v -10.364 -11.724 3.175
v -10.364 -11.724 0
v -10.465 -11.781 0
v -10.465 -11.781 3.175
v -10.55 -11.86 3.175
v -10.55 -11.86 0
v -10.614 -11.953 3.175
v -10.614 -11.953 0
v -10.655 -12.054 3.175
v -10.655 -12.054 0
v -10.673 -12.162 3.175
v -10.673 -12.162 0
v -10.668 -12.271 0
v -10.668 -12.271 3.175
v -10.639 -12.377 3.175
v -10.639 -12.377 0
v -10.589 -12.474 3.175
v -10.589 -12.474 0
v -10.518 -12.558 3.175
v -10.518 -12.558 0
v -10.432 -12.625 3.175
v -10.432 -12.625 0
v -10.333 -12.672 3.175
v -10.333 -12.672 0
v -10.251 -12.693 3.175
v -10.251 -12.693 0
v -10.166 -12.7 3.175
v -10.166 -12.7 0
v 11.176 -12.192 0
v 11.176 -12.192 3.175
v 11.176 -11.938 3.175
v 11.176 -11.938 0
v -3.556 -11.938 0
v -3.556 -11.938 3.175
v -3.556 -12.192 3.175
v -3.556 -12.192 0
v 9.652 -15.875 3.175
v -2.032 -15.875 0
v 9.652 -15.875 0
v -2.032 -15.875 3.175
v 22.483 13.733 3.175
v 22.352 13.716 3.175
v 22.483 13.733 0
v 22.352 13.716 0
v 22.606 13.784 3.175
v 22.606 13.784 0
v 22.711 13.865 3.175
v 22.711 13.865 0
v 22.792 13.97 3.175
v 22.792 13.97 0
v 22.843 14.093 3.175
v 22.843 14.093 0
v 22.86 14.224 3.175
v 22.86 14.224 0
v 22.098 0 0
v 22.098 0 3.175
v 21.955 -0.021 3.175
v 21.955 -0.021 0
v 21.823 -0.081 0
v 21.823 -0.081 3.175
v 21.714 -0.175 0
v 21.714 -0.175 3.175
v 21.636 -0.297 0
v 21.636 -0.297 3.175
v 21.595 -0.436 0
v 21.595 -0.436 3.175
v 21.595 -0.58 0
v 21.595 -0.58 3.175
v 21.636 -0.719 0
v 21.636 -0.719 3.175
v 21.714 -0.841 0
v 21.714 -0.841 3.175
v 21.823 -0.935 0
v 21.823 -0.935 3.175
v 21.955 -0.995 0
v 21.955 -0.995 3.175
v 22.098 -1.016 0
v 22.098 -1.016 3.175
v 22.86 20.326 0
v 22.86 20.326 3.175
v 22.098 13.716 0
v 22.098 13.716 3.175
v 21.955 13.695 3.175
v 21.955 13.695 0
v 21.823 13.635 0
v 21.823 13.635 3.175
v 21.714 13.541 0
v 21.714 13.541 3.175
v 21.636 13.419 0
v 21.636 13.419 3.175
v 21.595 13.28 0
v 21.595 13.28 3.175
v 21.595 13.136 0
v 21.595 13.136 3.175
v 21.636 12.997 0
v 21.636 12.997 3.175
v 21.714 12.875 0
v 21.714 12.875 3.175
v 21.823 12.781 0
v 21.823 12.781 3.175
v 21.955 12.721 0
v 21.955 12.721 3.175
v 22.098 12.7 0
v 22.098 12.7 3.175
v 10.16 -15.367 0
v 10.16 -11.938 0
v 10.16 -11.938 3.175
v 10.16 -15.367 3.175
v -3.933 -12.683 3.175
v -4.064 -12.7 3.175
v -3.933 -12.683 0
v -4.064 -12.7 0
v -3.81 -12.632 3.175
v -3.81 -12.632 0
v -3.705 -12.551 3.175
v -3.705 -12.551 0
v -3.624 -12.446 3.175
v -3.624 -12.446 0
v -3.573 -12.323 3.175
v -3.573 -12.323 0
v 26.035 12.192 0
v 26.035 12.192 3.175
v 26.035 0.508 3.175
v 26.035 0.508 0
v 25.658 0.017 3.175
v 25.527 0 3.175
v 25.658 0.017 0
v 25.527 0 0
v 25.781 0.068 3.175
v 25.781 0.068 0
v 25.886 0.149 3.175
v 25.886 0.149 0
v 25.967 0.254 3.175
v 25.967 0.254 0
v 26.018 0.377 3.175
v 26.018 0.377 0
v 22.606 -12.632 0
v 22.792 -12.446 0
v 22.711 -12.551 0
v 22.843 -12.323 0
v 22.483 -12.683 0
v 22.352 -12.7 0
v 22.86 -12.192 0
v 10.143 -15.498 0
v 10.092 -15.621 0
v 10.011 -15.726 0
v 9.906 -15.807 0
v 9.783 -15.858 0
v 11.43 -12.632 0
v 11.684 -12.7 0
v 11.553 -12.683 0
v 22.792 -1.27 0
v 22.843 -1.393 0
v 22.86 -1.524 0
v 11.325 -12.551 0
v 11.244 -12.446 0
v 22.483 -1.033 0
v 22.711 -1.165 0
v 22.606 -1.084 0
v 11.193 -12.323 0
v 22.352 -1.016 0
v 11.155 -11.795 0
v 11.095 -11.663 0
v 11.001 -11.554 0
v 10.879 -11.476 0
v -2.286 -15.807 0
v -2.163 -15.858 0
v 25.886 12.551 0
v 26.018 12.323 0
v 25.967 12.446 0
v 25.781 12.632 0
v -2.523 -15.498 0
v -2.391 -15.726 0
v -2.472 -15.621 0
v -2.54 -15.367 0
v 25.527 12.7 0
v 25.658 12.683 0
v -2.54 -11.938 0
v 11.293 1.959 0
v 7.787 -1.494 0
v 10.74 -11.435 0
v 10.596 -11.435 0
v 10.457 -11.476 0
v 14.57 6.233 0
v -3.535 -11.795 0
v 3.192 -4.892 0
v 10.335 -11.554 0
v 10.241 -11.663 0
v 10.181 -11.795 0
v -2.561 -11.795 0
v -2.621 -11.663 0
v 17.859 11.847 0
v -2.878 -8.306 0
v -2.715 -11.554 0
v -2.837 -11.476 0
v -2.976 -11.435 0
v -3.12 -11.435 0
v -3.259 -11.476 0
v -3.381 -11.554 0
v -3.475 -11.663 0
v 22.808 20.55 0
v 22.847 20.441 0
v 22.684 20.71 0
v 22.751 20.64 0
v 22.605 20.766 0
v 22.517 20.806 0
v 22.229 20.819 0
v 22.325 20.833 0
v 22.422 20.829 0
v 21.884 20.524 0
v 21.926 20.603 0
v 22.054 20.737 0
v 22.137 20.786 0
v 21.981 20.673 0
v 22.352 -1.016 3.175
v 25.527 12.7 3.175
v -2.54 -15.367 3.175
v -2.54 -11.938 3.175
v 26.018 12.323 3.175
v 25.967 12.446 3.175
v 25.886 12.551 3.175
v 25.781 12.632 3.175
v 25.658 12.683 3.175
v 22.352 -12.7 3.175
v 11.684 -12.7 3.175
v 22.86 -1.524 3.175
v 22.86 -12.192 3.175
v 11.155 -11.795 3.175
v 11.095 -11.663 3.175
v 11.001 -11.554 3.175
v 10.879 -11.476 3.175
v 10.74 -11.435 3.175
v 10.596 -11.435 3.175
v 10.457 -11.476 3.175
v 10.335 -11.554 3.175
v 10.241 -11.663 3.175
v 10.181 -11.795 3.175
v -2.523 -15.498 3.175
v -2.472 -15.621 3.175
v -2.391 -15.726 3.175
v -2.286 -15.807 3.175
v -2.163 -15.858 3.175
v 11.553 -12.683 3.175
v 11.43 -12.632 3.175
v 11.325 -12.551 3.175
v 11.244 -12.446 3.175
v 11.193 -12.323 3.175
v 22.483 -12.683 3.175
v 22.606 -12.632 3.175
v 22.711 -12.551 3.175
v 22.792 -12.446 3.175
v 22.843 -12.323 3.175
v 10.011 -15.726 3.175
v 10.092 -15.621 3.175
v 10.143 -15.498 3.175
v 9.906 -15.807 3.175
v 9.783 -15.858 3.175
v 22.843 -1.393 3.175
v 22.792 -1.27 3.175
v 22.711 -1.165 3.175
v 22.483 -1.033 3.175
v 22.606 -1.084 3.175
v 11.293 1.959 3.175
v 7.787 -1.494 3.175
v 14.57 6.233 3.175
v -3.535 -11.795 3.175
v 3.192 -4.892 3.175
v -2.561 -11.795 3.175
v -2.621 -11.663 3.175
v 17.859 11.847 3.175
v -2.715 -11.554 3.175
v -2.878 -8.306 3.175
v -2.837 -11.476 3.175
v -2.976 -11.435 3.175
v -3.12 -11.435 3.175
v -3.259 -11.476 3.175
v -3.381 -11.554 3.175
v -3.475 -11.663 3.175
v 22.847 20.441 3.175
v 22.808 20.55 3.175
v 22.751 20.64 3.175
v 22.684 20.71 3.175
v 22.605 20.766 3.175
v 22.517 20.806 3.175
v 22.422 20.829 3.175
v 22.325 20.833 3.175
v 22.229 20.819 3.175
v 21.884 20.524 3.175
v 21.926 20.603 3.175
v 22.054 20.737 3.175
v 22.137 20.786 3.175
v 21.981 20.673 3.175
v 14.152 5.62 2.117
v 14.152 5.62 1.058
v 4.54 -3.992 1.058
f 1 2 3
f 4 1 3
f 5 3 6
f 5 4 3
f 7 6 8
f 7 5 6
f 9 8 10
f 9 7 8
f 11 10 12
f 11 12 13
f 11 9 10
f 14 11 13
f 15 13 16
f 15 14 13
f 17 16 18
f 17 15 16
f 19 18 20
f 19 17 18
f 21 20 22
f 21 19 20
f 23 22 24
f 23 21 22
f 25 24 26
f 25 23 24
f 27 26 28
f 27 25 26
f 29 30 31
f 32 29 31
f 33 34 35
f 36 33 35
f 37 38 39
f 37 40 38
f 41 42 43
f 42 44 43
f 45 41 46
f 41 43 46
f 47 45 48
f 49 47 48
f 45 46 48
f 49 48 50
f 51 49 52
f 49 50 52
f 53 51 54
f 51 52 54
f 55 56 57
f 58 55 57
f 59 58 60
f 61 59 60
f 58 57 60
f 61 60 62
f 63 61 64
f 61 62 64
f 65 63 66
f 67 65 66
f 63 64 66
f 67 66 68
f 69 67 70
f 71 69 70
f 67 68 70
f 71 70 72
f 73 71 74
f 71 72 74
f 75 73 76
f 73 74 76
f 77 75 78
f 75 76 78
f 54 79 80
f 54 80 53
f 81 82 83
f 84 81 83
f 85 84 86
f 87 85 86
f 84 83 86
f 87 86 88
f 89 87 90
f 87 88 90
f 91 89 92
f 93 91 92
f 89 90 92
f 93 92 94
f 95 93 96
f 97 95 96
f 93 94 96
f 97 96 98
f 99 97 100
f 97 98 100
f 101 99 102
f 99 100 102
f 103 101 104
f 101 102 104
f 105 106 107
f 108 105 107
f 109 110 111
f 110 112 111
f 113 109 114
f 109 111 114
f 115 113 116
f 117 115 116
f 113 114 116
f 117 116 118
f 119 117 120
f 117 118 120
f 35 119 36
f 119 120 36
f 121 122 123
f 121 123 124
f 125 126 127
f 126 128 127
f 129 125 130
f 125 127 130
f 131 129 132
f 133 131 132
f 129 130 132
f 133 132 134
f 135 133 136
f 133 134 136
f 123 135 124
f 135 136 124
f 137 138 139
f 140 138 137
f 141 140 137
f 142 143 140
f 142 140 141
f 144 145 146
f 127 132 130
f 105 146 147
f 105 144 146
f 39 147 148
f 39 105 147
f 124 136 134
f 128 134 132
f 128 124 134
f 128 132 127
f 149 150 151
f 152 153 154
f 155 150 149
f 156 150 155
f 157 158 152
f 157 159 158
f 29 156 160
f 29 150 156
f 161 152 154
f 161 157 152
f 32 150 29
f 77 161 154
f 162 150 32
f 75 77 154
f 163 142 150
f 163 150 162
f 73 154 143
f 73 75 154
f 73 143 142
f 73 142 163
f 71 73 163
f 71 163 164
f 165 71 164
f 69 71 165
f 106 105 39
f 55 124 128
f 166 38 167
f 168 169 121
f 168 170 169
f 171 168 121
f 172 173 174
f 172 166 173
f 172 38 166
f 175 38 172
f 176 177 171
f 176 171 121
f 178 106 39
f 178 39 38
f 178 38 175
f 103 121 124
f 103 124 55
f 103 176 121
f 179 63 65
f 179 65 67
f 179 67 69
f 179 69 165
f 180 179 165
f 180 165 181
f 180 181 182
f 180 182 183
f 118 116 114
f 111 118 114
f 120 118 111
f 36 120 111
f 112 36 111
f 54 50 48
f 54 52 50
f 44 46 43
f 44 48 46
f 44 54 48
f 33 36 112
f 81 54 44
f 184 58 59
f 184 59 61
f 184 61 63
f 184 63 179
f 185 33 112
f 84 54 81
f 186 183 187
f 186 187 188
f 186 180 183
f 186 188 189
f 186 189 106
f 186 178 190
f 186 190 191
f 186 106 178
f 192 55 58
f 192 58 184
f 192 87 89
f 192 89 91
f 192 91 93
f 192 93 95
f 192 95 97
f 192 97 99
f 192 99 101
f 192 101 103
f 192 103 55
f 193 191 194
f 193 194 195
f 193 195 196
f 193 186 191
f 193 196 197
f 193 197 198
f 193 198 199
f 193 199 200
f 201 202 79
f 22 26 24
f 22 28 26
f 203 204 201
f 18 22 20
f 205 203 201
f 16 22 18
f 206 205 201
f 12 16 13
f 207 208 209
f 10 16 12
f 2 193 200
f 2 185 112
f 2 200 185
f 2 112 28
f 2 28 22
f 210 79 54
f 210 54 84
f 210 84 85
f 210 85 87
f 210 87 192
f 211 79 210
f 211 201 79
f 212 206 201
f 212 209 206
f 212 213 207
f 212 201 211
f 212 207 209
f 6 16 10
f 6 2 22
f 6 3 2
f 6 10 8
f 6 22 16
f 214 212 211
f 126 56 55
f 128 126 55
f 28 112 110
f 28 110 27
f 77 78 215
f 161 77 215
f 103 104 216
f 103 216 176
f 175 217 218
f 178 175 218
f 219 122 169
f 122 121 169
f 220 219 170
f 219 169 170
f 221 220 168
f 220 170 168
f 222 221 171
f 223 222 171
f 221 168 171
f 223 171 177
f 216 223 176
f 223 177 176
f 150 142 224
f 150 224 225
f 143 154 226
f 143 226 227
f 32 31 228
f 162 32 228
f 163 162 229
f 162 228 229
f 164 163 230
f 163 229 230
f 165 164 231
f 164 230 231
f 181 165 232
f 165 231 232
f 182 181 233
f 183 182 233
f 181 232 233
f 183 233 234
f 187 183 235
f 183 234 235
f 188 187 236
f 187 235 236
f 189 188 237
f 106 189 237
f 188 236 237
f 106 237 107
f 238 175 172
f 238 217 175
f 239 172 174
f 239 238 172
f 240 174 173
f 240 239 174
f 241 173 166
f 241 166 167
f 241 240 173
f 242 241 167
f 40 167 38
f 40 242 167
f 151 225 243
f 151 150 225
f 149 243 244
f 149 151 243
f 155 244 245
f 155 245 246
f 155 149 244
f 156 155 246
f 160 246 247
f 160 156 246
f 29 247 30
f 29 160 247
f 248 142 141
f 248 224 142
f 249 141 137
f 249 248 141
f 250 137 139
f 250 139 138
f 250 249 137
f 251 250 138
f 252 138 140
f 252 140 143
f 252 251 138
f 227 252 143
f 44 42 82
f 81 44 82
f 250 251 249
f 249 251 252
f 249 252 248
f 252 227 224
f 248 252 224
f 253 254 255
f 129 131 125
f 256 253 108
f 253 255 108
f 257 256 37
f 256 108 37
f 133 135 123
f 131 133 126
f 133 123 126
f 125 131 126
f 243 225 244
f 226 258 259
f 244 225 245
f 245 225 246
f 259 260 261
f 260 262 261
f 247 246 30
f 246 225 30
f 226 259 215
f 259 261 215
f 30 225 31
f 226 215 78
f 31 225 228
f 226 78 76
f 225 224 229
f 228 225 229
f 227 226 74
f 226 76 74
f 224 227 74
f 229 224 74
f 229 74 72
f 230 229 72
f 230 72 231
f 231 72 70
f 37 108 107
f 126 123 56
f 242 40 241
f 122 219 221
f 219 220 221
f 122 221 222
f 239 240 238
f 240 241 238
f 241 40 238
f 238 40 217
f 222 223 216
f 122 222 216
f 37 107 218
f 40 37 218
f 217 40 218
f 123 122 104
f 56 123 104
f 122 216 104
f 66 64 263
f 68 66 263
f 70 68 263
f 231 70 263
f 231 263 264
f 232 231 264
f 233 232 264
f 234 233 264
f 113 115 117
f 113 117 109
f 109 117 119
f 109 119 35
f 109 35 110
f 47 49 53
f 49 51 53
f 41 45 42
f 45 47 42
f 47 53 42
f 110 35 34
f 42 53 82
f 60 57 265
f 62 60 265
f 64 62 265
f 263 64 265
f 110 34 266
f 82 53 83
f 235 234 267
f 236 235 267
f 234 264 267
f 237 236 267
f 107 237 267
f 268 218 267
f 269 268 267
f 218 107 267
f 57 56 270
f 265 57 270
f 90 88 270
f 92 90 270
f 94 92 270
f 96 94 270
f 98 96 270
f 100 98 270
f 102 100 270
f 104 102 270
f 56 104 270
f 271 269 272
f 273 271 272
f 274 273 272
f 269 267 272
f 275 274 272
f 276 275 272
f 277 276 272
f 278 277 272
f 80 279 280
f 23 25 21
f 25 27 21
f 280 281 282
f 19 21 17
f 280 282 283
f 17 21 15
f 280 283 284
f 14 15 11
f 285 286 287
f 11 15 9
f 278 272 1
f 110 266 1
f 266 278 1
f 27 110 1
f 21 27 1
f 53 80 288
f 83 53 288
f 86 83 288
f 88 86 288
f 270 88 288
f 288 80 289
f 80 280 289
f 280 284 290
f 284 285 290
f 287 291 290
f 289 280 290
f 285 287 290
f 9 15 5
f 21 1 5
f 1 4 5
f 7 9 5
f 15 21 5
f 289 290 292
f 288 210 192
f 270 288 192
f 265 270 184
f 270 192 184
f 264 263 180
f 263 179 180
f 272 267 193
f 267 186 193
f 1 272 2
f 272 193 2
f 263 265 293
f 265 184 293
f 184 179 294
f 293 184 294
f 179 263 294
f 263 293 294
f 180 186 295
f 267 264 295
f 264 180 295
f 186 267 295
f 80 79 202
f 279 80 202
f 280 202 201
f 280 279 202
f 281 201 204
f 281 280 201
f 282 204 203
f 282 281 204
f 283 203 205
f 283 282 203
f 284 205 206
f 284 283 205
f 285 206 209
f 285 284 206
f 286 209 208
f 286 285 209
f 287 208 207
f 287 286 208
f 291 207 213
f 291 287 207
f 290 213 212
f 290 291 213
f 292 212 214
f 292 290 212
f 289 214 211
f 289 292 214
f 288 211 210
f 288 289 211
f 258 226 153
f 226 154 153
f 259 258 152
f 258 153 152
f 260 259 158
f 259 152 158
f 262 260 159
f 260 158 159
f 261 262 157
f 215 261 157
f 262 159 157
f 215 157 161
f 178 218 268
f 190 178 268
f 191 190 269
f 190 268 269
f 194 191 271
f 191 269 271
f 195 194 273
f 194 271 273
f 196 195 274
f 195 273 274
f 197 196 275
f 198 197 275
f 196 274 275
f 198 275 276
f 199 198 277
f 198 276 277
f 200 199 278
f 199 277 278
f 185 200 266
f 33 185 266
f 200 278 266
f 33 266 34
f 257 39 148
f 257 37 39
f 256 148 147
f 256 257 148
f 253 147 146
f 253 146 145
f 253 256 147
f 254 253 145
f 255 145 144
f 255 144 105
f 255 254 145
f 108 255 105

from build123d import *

# Parameters (mm, degrees)
BOSS_EXTRUDE1_DEPTH = 3.175
SKETCH2_W           = 12.7
SKETCH2_H           = 3.175
BOSS_EXTRUDE2_DEPTH = 3.175
SKETCH3_W           = 3.175
SKETCH3_H           = 12.7
BOSS_EXTRUDE3_DEPTH = 3.175
CUT_EXTRUDE1_REACH  = 5.175
FILLET1_R           = 0.508


with BuildPart() as part:
    # Sketch1 → Boss-Extrude1 (new body)
    with BuildSketch(Plane.XY):
        with BuildLine():
            Line((22.86, -12.7), (-12.7, -12.7))
            add(Edge.make_bspline(
                [(22.86, 22.86), (14.060256121, 1.487897552), (8.672102448, -3.900256121), (-12.7, -12.7)],
                knots=[0, 0, 0, 0, 1, 1, 1, 1], degree=3))
            Line((22.86, 22.86), (22.86, -12.7))
        make_face()
    extrude(amount=BOSS_EXTRUDE1_DEPTH)

    # Sketch2 → Boss-Extrude2 (add)
    with BuildSketch(Plane.XZ.offset(12.7)):
        with Locations((3.81, 1.5875)):
            Rectangle(SKETCH2_W, SKETCH2_H)
    extrude(amount=BOSS_EXTRUDE2_DEPTH)

    # Sketch3 → Boss-Extrude3 (add)
    with BuildSketch(Plane(origin=(22.86, 0, 0), x_dir=(0, 0, -1), z_dir=(1, 0, 0))):
        with Locations((-1.5875, 6.35)):
            Rectangle(SKETCH3_W, SKETCH3_H)
    extrude(amount=BOSS_EXTRUDE3_DEPTH)

    # Sketch4 → Cut-Extrude1 (cut, up to next)
    with BuildSketch(Plane.XY.offset(3.175), mode=Mode.PRIVATE) as cut_extrude1_sk1:
        with BuildLine():
            Line((-3.556, -11.938), (-3.556, -12.7))
            Line((-3.556, -12.7), (-2.54, -12.7))
            Line((-2.54, -12.7), (-2.54, -11.938))
            ThreePointArc((-2.54, -11.938), (-3.048, -11.43), (-3.556, -11.938))
        make_face()
    cut_extrude1_tool1 = extrude(cut_extrude1_sk1.sketch, amount=-CUT_EXTRUDE1_REACH, mode=Mode.PRIVATE) & part.part
    add(cut_extrude1_tool1.solids().sort_by_distance((-3.048, -12.113972, 3.175))[0], mode=Mode.SUBTRACT)
    # Sketch4 → Cut-Extrude1 (cut, up to next)
    with BuildSketch(Plane.XY.offset(3.175), mode=Mode.PRIVATE) as cut_extrude1_sk2:
        with BuildLine():
            Line((10.16, -11.938), (10.16, -12.7))
            Line((10.16, -12.7), (11.176, -12.7))
            Line((11.176, -12.7), (11.176, -11.938))
            ThreePointArc((11.176, -11.938), (10.668, -11.43), (10.16, -11.938))
        make_face()
    cut_extrude1_tool2 = extrude(cut_extrude1_sk2.sketch, amount=-CUT_EXTRUDE1_REACH, mode=Mode.PRIVATE) & part.part
    add(cut_extrude1_tool2.solids().sort_by_distance((10.668, -12.113972, 3.175))[0], mode=Mode.SUBTRACT)
    # Sketch4 → Cut-Extrude1 (cut, up to next)
    with BuildSketch(Plane.XY.offset(3.175), mode=Mode.PRIVATE) as cut_extrude1_sk3:
        with BuildLine():
            Line((22.098, -1.016), (22.86, -1.016))
            Line((22.86, -1.016), (22.86, 0))
            Line((22.86, 0), (22.098, 0))
            ThreePointArc((22.098, 0), (21.59, -0.508), (22.098, -1.016))
        make_face()
    cut_extrude1_tool3 = extrude(cut_extrude1_sk3.sketch, amount=-CUT_EXTRUDE1_REACH, mode=Mode.PRIVATE) & part.part
    add(cut_extrude1_tool3.solids().sort_by_distance((22.273972, -0.508, 3.175))[0], mode=Mode.SUBTRACT)
    # Sketch4 → Cut-Extrude1 (cut, up to next)
    with BuildSketch(Plane.XY.offset(3.175), mode=Mode.PRIVATE) as cut_extrude1_sk4:
        with BuildLine():
            Line((22.098, 12.7), (22.86, 12.7))
            Line((22.86, 12.7), (22.86, 13.716))
            Line((22.86, 13.716), (22.098, 13.716))
            ThreePointArc((22.098, 13.716), (21.59, 13.208), (22.098, 12.7))
        make_face()
    cut_extrude1_tool4 = extrude(cut_extrude1_sk4.sketch, amount=-CUT_EXTRUDE1_REACH, mode=Mode.PRIVATE) & part.part
    add(cut_extrude1_tool4.solids().sort_by_distance((22.273972, 13.208, 3.175))[0], mode=Mode.SUBTRACT)

    # Fillet1
    fillet1_edges = [part.edges().sort_by_distance(p)[0] for p in [
        (22.86, 13.716, 1.5875),
        (26.035, 12.7, 1.5875),
        (26.035, 0, 1.5875),
        (22.86, -1.016, 1.5875),
        (22.86, -12.7, 1.5875),
        (11.176, -12.7, 1.5875),
        (10.16, -15.875, 1.5875),
        (-2.54, -15.875, 1.5875),
        (-3.556, -12.7, 1.5875),
        (-12.7, -12.7, 1.5875),
        (22.86, 22.86, 1.5875),
    ]]
    fillet(fillet1_edges, radius=FILLET1_R)


solid = part.part
